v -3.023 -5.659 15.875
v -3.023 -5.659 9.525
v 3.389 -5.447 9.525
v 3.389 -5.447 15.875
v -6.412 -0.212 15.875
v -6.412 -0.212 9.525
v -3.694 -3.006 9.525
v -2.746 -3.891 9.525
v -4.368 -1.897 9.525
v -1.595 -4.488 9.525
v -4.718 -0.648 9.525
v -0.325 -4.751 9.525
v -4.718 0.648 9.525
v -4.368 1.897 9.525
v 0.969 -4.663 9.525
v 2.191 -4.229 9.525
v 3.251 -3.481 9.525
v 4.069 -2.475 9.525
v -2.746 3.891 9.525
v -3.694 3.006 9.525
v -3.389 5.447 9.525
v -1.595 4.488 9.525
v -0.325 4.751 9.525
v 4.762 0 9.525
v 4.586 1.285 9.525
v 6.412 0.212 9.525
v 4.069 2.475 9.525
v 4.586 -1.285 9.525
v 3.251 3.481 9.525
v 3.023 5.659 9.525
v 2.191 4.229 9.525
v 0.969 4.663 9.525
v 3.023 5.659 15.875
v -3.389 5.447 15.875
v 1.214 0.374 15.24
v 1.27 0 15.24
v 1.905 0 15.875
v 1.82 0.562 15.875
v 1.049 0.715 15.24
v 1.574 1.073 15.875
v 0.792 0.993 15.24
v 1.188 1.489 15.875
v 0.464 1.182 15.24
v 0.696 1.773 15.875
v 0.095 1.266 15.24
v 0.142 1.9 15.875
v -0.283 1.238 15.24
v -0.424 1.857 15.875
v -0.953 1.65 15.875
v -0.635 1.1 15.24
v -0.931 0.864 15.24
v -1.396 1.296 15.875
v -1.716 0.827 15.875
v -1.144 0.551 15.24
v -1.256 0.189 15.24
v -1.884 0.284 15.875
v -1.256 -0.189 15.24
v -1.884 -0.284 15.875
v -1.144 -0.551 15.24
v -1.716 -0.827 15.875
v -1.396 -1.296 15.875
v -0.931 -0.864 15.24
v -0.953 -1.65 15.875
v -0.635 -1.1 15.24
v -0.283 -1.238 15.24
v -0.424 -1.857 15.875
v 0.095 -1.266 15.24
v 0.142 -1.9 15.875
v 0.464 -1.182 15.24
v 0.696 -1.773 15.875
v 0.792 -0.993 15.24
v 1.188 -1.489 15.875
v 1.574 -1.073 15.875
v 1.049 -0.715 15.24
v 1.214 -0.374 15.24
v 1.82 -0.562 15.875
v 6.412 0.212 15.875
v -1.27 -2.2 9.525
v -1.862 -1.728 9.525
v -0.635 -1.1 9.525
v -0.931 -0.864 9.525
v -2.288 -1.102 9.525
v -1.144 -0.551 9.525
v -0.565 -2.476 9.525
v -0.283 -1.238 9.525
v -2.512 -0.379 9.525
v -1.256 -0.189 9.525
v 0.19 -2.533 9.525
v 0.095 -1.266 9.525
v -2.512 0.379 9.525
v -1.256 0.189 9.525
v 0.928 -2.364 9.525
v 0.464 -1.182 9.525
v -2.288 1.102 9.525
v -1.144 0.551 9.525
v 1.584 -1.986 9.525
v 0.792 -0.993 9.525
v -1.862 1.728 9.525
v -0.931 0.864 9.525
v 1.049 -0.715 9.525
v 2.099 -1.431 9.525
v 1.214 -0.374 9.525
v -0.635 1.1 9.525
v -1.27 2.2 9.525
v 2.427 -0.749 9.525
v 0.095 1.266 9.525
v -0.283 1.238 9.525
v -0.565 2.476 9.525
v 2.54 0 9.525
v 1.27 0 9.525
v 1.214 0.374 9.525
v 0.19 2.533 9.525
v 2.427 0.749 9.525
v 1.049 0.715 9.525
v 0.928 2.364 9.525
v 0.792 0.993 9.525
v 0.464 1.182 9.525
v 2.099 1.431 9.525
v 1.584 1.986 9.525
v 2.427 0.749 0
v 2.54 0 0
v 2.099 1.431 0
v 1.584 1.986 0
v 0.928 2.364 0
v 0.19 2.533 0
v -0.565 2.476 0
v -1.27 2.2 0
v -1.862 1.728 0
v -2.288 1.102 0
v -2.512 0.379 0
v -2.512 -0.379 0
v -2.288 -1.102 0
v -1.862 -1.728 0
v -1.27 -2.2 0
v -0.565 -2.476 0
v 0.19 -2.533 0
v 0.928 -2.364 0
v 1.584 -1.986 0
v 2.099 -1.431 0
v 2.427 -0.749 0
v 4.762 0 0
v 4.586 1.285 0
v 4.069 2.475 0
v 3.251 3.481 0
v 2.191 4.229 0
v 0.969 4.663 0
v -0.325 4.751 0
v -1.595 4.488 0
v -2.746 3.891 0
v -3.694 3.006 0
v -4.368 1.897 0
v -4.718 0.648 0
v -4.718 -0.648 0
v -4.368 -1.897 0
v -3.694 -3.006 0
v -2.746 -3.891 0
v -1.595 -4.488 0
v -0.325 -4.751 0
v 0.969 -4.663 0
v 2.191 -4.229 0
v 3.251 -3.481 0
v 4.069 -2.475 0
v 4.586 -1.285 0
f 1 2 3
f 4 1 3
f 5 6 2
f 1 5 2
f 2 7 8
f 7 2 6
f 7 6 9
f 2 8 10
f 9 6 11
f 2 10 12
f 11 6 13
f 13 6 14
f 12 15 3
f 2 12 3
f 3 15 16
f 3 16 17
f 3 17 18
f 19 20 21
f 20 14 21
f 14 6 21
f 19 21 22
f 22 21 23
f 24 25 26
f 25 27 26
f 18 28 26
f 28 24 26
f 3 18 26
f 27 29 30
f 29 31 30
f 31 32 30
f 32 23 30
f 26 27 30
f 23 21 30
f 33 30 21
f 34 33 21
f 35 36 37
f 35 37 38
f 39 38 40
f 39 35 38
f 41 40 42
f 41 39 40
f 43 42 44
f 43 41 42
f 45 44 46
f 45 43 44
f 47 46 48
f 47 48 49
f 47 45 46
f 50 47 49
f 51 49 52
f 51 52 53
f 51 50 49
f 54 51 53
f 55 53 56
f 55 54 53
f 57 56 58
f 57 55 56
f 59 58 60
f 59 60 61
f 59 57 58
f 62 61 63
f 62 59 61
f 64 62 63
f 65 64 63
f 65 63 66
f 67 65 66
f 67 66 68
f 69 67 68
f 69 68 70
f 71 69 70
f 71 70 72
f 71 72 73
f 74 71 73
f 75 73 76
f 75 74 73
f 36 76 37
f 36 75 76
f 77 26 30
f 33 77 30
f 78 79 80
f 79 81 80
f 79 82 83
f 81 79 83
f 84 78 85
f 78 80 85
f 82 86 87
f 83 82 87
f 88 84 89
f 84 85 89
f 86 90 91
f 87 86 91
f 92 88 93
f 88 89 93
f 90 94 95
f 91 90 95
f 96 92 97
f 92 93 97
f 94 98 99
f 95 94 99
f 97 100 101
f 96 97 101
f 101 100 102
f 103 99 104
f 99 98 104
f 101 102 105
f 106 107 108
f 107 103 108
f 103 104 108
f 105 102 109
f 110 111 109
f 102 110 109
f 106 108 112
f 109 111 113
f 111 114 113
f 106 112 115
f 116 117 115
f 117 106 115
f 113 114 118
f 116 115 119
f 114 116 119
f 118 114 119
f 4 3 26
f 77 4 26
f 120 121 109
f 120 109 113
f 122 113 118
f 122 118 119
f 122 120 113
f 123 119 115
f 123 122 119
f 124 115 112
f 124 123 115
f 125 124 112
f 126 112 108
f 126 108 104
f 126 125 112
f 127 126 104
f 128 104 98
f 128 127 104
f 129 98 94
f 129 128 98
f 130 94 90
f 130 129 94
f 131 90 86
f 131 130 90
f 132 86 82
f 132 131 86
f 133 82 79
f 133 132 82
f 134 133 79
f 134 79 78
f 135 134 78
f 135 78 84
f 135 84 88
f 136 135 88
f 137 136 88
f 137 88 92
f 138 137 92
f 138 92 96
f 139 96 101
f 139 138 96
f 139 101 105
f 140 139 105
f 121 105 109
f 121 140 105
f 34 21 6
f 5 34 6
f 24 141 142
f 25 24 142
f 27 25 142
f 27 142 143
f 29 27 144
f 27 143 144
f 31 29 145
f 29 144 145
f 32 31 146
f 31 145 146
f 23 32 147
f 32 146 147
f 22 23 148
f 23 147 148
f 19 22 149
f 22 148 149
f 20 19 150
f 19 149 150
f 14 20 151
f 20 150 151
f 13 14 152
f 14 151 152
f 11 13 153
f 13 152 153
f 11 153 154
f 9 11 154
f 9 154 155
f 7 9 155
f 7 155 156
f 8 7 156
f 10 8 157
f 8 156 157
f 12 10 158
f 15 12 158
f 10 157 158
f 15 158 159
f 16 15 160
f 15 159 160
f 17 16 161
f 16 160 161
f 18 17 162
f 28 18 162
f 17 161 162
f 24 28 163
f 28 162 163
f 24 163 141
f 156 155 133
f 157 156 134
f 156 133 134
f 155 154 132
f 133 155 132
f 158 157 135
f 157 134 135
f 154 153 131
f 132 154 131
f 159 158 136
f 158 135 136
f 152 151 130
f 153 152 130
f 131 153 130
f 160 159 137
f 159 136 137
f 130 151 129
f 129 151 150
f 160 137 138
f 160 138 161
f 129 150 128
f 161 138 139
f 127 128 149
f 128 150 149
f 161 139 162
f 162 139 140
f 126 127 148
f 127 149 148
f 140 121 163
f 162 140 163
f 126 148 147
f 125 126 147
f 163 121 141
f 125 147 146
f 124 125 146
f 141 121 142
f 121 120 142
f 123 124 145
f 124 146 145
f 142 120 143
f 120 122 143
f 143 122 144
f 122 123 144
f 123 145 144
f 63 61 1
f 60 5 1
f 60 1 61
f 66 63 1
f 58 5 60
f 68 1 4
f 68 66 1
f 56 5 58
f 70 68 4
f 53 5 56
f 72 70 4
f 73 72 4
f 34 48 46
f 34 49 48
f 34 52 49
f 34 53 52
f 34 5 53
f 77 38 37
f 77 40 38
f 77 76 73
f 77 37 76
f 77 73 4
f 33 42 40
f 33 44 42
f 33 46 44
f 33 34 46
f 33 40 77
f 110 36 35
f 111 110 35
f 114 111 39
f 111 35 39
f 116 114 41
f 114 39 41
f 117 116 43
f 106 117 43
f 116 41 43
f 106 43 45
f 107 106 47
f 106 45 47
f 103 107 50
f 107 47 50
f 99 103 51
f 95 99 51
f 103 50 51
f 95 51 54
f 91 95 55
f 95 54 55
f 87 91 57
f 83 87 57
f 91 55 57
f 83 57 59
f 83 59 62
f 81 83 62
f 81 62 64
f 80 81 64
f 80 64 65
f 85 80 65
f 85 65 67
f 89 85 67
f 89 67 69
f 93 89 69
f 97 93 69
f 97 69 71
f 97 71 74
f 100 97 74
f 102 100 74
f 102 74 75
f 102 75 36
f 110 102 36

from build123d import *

# Parameters (mm, degrees)
SKETCH1_R           = 4.7625
SKETCH1_R_2         = 2.54
BOSS_EXTRUDE1_DEPTH = 9.525
BOSS_EXTRUDE2_DEPTH = 6.35
CUT_EXTRUDE1_REACH  = 17.875
SKETCH3_R           = 1.27
CHAMFER1_SIZE       = 0.635


with BuildPart() as part:
    # Sketch1 → Boss-Extrude1 (new body)
    with BuildSketch(Plane.XY):
        Circle(SKETCH1_R)
        Circle(SKETCH1_R_2, mode=Mode.SUBTRACT)
    extrude(amount=BOSS_EXTRUDE1_DEPTH)

    # Sketch2 → Boss-Extrude2 (add)
    with BuildSketch(Plane.XY.offset(9.525)):
        Polygon((3.022954056, 5.659001754), (-3.389362251, 5.447455885), (-6.412316308, -0.21154587), (-3.022954056, -5.659001754), (3.389362251, -5.447455885), (6.412316308, 0.21154587), align=None)
    extrude(amount=BOSS_EXTRUDE2_DEPTH)

    # Sketch3 → Cut-Extrude1 (cut, up to next)
    with BuildSketch(Plane.XY.offset(15.875), mode=Mode.PRIVATE) as cut_extrude1_sk1:
        Circle(SKETCH3_R)
    cut_extrude1_tool1 = extrude(cut_extrude1_sk1.sketch, amount=-CUT_EXTRUDE1_REACH, mode=Mode.PRIVATE) & part.part
    add(cut_extrude1_tool1.solids().sort_by_distance((0, 0, 15.875))[0], mode=Mode.SUBTRACT)

    # Chamfer1
    chamfer1_edges = [part.edges().sort_by_distance(p)[0] for p in [
        (-1.27, 0, 15.875),
    ]]
    chamfer(chamfer1_edges, length=CHAMFER1_SIZE)


solid = part.part
